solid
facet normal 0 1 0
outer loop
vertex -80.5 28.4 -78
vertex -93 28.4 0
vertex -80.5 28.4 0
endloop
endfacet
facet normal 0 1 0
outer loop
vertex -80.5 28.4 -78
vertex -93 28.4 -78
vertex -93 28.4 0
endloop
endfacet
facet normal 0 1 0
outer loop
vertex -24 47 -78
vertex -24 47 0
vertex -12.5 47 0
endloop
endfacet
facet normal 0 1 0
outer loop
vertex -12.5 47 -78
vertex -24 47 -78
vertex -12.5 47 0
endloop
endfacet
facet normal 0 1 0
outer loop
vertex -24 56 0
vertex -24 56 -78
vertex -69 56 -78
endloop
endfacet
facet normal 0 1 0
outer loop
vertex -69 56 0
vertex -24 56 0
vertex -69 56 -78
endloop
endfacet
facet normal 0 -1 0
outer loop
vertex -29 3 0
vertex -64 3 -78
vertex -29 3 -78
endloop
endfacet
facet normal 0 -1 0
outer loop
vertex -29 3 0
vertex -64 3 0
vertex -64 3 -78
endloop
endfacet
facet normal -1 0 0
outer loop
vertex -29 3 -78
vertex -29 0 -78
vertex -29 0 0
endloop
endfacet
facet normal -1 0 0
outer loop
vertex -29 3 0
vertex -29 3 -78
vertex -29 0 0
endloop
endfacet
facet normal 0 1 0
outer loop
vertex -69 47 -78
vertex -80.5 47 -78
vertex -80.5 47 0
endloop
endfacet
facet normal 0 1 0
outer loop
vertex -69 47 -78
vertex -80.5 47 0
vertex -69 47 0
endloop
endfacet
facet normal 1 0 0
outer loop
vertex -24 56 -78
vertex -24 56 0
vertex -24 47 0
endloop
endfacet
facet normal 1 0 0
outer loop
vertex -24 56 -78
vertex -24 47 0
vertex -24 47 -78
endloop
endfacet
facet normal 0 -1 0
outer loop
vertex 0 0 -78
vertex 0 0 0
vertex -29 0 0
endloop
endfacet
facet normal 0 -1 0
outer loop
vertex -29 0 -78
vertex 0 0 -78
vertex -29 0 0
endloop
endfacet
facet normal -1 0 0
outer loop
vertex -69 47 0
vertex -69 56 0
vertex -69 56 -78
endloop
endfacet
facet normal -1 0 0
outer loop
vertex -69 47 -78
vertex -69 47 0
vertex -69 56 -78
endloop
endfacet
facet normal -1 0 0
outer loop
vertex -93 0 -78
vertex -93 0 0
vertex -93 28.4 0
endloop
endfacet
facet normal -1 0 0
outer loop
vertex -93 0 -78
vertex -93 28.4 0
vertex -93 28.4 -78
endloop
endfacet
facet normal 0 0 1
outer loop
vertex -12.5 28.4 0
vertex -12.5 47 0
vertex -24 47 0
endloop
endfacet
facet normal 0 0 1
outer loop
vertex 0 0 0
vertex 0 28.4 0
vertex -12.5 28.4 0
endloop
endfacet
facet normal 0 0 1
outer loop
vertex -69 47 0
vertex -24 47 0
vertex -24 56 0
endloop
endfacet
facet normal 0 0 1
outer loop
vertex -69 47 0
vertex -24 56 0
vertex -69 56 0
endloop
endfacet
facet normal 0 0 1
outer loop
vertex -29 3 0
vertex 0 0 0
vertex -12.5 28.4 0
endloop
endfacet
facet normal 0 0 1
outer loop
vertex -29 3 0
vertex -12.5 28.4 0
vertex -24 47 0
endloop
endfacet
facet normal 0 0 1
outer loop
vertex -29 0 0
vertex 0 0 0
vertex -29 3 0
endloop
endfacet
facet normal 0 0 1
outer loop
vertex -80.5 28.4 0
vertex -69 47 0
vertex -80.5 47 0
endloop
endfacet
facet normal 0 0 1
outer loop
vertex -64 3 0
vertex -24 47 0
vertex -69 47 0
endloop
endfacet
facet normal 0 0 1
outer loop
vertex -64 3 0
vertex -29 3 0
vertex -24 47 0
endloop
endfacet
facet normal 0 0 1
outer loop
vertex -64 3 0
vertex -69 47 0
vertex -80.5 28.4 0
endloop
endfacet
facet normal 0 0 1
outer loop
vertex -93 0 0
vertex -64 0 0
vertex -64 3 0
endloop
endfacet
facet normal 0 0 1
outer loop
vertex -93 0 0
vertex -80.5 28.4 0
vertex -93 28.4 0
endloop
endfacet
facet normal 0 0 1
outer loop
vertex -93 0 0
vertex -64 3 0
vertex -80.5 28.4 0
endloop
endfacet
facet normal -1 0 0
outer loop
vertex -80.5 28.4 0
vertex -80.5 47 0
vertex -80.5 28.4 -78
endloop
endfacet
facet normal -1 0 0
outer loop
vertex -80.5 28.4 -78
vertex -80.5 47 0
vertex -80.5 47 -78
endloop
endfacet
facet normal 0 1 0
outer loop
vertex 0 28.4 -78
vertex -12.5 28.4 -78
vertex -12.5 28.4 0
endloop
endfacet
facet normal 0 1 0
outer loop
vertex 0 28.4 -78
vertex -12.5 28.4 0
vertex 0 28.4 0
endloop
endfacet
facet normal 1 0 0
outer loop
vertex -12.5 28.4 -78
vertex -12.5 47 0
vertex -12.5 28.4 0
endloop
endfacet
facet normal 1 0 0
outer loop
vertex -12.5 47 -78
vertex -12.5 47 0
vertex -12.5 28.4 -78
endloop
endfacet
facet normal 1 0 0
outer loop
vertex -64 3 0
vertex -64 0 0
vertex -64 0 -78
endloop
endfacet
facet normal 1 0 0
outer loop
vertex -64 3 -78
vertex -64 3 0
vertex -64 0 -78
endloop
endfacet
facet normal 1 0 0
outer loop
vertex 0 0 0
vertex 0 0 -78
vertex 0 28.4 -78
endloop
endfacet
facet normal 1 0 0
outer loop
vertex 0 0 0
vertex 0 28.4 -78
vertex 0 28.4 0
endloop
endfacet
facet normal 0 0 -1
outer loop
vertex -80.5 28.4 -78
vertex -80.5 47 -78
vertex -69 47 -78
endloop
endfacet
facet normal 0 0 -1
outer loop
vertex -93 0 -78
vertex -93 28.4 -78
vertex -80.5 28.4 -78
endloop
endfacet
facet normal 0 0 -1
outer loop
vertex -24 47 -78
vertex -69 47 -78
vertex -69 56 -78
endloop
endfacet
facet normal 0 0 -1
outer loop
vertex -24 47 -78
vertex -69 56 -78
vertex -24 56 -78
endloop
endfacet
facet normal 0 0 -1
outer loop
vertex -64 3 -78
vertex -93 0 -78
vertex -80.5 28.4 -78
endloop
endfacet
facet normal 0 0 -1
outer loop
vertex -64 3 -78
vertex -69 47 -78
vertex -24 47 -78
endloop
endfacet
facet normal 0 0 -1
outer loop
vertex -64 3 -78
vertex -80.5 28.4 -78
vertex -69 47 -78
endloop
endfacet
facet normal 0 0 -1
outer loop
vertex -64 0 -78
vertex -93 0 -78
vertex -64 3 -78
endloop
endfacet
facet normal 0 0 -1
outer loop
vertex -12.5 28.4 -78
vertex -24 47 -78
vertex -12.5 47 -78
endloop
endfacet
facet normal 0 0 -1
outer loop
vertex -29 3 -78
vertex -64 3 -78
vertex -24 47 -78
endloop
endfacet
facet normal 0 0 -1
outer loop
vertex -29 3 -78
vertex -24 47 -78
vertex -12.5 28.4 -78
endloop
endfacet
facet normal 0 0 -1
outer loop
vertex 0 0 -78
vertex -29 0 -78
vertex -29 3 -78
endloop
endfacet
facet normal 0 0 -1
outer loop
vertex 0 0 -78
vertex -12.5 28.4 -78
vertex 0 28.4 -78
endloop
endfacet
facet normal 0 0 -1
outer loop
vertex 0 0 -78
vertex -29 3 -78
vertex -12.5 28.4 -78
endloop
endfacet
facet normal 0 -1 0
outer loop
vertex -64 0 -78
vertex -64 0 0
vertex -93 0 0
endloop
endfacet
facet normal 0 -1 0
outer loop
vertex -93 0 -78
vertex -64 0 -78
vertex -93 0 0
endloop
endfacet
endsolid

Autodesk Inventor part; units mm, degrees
ref_plane "YZ Plane" through (0, 0, 0) normal (1, 0, 0) x (0, 1, 0)
ref_plane "XZ Plane" through (0, 0, 0) normal (0, 1, 0) x (-1, 0, 0)
ref_plane "XY Plane" through (0, 0, 0) normal (0, 0, 1) x (1, 0, 0)
sketch "Sketch1" plane through (0, 0, 0) normal (0, 1, 0) x (-1, 0, 0)
  line L0 (0, 0) -> (93, 0)
  line L1 (93, 0) -> (93, -78)
  line L2 (93, -78) -> (0, -78)
  line L3 (0, -78) -> (0, 0)
  dimension "d0" = 78
  dimension "d1" = 93
extrude "Extrusion1" add sketch "Sketch1" along normal blind 56
sketch "Sketch2" plane through (0, 0, 0) normal (0, -1, 0) x (1, 0, 0)
  line L0 (-93, 0) -> (0, 0) projected
  line L1 (0, -78) -> (-93, -78) projected
  line L2 (-29, 0) -> (-64, 0)
  line L3 (-64, 0) -> (-64, -78)
  line L4 (-64, -78) -> (-29, -78)
  line L5 (-29, -78) -> (-29, 0)
  line L6 (-93, -78) -> (-93, 0) projected
  dimension "d4" = 29
  dimension "d5" = 35
extrude "Extrusion2" cut sketch "Sketch2" against normal blind 3 contours L0 L5 L1 L3
sketch "Sketch3" plane through (0, 56, 0) normal (0, 1, 0) x (1, 0, 0)
  line L0 (0, 78) -> (-29, 78) projected
  line L1 (0, 0) -> (-12.5, 0)
  line L2 (-12.5, 0) -> (-12.5, 78)
  line L3 (-12.5, 78) -> (0, 78)
  line L4 (0, 78) -> (0, 0)
  line L5 (-93, 0) -> (-64, 0) projected
  line L6 (-93, 0) -> (-80.5, 0)
  line L7 (-80.5, 0) -> (-80.5, 78)
  line L8 (-80.5, 78) -> (-93, 78)
  line L9 (-93, 78) -> (-93, 0)
  dimension "d8" = 12.5
  dimension "d9" = 12.5
extrude "Extrusion3" cut sketch "Sketch3" against normal blind 27.6
sketch "Sketch4" plane through (0, 56, 0) normal (0, 1, 0) x (1, 0, 0)
  line L0 (-80.5, 0) -> (-12.5, 0) projected
  line L1 (-12.5, 78) -> (-80.5, 78) projected
  line L2 (-12.5, 0) -> (-24, 0)
  line L3 (-24, 0) -> (-24, 78)
  line L4 (-24, 78) -> (-12.5, 78)
  line L5 (-12.5, 78) -> (-12.5, 0)
  line L6 (-80.5, 0) -> (-69, 0)
  line L7 (-69, 0) -> (-69, 78)
  line L8 (-69, 78) -> (-80.5, 78)
  line L9 (-80.5, 78) -> (-80.5, 0)
  point P0 (0, 0)
  dimension "d12" = 11.5
  dimension "d13" = 11.5
extrude "Extrusion4" cut sketch "Sketch4" against normal blind 9 contours L9 L1 L7 L0 | L3 L1 L5 L0
properties part number "Supply"
